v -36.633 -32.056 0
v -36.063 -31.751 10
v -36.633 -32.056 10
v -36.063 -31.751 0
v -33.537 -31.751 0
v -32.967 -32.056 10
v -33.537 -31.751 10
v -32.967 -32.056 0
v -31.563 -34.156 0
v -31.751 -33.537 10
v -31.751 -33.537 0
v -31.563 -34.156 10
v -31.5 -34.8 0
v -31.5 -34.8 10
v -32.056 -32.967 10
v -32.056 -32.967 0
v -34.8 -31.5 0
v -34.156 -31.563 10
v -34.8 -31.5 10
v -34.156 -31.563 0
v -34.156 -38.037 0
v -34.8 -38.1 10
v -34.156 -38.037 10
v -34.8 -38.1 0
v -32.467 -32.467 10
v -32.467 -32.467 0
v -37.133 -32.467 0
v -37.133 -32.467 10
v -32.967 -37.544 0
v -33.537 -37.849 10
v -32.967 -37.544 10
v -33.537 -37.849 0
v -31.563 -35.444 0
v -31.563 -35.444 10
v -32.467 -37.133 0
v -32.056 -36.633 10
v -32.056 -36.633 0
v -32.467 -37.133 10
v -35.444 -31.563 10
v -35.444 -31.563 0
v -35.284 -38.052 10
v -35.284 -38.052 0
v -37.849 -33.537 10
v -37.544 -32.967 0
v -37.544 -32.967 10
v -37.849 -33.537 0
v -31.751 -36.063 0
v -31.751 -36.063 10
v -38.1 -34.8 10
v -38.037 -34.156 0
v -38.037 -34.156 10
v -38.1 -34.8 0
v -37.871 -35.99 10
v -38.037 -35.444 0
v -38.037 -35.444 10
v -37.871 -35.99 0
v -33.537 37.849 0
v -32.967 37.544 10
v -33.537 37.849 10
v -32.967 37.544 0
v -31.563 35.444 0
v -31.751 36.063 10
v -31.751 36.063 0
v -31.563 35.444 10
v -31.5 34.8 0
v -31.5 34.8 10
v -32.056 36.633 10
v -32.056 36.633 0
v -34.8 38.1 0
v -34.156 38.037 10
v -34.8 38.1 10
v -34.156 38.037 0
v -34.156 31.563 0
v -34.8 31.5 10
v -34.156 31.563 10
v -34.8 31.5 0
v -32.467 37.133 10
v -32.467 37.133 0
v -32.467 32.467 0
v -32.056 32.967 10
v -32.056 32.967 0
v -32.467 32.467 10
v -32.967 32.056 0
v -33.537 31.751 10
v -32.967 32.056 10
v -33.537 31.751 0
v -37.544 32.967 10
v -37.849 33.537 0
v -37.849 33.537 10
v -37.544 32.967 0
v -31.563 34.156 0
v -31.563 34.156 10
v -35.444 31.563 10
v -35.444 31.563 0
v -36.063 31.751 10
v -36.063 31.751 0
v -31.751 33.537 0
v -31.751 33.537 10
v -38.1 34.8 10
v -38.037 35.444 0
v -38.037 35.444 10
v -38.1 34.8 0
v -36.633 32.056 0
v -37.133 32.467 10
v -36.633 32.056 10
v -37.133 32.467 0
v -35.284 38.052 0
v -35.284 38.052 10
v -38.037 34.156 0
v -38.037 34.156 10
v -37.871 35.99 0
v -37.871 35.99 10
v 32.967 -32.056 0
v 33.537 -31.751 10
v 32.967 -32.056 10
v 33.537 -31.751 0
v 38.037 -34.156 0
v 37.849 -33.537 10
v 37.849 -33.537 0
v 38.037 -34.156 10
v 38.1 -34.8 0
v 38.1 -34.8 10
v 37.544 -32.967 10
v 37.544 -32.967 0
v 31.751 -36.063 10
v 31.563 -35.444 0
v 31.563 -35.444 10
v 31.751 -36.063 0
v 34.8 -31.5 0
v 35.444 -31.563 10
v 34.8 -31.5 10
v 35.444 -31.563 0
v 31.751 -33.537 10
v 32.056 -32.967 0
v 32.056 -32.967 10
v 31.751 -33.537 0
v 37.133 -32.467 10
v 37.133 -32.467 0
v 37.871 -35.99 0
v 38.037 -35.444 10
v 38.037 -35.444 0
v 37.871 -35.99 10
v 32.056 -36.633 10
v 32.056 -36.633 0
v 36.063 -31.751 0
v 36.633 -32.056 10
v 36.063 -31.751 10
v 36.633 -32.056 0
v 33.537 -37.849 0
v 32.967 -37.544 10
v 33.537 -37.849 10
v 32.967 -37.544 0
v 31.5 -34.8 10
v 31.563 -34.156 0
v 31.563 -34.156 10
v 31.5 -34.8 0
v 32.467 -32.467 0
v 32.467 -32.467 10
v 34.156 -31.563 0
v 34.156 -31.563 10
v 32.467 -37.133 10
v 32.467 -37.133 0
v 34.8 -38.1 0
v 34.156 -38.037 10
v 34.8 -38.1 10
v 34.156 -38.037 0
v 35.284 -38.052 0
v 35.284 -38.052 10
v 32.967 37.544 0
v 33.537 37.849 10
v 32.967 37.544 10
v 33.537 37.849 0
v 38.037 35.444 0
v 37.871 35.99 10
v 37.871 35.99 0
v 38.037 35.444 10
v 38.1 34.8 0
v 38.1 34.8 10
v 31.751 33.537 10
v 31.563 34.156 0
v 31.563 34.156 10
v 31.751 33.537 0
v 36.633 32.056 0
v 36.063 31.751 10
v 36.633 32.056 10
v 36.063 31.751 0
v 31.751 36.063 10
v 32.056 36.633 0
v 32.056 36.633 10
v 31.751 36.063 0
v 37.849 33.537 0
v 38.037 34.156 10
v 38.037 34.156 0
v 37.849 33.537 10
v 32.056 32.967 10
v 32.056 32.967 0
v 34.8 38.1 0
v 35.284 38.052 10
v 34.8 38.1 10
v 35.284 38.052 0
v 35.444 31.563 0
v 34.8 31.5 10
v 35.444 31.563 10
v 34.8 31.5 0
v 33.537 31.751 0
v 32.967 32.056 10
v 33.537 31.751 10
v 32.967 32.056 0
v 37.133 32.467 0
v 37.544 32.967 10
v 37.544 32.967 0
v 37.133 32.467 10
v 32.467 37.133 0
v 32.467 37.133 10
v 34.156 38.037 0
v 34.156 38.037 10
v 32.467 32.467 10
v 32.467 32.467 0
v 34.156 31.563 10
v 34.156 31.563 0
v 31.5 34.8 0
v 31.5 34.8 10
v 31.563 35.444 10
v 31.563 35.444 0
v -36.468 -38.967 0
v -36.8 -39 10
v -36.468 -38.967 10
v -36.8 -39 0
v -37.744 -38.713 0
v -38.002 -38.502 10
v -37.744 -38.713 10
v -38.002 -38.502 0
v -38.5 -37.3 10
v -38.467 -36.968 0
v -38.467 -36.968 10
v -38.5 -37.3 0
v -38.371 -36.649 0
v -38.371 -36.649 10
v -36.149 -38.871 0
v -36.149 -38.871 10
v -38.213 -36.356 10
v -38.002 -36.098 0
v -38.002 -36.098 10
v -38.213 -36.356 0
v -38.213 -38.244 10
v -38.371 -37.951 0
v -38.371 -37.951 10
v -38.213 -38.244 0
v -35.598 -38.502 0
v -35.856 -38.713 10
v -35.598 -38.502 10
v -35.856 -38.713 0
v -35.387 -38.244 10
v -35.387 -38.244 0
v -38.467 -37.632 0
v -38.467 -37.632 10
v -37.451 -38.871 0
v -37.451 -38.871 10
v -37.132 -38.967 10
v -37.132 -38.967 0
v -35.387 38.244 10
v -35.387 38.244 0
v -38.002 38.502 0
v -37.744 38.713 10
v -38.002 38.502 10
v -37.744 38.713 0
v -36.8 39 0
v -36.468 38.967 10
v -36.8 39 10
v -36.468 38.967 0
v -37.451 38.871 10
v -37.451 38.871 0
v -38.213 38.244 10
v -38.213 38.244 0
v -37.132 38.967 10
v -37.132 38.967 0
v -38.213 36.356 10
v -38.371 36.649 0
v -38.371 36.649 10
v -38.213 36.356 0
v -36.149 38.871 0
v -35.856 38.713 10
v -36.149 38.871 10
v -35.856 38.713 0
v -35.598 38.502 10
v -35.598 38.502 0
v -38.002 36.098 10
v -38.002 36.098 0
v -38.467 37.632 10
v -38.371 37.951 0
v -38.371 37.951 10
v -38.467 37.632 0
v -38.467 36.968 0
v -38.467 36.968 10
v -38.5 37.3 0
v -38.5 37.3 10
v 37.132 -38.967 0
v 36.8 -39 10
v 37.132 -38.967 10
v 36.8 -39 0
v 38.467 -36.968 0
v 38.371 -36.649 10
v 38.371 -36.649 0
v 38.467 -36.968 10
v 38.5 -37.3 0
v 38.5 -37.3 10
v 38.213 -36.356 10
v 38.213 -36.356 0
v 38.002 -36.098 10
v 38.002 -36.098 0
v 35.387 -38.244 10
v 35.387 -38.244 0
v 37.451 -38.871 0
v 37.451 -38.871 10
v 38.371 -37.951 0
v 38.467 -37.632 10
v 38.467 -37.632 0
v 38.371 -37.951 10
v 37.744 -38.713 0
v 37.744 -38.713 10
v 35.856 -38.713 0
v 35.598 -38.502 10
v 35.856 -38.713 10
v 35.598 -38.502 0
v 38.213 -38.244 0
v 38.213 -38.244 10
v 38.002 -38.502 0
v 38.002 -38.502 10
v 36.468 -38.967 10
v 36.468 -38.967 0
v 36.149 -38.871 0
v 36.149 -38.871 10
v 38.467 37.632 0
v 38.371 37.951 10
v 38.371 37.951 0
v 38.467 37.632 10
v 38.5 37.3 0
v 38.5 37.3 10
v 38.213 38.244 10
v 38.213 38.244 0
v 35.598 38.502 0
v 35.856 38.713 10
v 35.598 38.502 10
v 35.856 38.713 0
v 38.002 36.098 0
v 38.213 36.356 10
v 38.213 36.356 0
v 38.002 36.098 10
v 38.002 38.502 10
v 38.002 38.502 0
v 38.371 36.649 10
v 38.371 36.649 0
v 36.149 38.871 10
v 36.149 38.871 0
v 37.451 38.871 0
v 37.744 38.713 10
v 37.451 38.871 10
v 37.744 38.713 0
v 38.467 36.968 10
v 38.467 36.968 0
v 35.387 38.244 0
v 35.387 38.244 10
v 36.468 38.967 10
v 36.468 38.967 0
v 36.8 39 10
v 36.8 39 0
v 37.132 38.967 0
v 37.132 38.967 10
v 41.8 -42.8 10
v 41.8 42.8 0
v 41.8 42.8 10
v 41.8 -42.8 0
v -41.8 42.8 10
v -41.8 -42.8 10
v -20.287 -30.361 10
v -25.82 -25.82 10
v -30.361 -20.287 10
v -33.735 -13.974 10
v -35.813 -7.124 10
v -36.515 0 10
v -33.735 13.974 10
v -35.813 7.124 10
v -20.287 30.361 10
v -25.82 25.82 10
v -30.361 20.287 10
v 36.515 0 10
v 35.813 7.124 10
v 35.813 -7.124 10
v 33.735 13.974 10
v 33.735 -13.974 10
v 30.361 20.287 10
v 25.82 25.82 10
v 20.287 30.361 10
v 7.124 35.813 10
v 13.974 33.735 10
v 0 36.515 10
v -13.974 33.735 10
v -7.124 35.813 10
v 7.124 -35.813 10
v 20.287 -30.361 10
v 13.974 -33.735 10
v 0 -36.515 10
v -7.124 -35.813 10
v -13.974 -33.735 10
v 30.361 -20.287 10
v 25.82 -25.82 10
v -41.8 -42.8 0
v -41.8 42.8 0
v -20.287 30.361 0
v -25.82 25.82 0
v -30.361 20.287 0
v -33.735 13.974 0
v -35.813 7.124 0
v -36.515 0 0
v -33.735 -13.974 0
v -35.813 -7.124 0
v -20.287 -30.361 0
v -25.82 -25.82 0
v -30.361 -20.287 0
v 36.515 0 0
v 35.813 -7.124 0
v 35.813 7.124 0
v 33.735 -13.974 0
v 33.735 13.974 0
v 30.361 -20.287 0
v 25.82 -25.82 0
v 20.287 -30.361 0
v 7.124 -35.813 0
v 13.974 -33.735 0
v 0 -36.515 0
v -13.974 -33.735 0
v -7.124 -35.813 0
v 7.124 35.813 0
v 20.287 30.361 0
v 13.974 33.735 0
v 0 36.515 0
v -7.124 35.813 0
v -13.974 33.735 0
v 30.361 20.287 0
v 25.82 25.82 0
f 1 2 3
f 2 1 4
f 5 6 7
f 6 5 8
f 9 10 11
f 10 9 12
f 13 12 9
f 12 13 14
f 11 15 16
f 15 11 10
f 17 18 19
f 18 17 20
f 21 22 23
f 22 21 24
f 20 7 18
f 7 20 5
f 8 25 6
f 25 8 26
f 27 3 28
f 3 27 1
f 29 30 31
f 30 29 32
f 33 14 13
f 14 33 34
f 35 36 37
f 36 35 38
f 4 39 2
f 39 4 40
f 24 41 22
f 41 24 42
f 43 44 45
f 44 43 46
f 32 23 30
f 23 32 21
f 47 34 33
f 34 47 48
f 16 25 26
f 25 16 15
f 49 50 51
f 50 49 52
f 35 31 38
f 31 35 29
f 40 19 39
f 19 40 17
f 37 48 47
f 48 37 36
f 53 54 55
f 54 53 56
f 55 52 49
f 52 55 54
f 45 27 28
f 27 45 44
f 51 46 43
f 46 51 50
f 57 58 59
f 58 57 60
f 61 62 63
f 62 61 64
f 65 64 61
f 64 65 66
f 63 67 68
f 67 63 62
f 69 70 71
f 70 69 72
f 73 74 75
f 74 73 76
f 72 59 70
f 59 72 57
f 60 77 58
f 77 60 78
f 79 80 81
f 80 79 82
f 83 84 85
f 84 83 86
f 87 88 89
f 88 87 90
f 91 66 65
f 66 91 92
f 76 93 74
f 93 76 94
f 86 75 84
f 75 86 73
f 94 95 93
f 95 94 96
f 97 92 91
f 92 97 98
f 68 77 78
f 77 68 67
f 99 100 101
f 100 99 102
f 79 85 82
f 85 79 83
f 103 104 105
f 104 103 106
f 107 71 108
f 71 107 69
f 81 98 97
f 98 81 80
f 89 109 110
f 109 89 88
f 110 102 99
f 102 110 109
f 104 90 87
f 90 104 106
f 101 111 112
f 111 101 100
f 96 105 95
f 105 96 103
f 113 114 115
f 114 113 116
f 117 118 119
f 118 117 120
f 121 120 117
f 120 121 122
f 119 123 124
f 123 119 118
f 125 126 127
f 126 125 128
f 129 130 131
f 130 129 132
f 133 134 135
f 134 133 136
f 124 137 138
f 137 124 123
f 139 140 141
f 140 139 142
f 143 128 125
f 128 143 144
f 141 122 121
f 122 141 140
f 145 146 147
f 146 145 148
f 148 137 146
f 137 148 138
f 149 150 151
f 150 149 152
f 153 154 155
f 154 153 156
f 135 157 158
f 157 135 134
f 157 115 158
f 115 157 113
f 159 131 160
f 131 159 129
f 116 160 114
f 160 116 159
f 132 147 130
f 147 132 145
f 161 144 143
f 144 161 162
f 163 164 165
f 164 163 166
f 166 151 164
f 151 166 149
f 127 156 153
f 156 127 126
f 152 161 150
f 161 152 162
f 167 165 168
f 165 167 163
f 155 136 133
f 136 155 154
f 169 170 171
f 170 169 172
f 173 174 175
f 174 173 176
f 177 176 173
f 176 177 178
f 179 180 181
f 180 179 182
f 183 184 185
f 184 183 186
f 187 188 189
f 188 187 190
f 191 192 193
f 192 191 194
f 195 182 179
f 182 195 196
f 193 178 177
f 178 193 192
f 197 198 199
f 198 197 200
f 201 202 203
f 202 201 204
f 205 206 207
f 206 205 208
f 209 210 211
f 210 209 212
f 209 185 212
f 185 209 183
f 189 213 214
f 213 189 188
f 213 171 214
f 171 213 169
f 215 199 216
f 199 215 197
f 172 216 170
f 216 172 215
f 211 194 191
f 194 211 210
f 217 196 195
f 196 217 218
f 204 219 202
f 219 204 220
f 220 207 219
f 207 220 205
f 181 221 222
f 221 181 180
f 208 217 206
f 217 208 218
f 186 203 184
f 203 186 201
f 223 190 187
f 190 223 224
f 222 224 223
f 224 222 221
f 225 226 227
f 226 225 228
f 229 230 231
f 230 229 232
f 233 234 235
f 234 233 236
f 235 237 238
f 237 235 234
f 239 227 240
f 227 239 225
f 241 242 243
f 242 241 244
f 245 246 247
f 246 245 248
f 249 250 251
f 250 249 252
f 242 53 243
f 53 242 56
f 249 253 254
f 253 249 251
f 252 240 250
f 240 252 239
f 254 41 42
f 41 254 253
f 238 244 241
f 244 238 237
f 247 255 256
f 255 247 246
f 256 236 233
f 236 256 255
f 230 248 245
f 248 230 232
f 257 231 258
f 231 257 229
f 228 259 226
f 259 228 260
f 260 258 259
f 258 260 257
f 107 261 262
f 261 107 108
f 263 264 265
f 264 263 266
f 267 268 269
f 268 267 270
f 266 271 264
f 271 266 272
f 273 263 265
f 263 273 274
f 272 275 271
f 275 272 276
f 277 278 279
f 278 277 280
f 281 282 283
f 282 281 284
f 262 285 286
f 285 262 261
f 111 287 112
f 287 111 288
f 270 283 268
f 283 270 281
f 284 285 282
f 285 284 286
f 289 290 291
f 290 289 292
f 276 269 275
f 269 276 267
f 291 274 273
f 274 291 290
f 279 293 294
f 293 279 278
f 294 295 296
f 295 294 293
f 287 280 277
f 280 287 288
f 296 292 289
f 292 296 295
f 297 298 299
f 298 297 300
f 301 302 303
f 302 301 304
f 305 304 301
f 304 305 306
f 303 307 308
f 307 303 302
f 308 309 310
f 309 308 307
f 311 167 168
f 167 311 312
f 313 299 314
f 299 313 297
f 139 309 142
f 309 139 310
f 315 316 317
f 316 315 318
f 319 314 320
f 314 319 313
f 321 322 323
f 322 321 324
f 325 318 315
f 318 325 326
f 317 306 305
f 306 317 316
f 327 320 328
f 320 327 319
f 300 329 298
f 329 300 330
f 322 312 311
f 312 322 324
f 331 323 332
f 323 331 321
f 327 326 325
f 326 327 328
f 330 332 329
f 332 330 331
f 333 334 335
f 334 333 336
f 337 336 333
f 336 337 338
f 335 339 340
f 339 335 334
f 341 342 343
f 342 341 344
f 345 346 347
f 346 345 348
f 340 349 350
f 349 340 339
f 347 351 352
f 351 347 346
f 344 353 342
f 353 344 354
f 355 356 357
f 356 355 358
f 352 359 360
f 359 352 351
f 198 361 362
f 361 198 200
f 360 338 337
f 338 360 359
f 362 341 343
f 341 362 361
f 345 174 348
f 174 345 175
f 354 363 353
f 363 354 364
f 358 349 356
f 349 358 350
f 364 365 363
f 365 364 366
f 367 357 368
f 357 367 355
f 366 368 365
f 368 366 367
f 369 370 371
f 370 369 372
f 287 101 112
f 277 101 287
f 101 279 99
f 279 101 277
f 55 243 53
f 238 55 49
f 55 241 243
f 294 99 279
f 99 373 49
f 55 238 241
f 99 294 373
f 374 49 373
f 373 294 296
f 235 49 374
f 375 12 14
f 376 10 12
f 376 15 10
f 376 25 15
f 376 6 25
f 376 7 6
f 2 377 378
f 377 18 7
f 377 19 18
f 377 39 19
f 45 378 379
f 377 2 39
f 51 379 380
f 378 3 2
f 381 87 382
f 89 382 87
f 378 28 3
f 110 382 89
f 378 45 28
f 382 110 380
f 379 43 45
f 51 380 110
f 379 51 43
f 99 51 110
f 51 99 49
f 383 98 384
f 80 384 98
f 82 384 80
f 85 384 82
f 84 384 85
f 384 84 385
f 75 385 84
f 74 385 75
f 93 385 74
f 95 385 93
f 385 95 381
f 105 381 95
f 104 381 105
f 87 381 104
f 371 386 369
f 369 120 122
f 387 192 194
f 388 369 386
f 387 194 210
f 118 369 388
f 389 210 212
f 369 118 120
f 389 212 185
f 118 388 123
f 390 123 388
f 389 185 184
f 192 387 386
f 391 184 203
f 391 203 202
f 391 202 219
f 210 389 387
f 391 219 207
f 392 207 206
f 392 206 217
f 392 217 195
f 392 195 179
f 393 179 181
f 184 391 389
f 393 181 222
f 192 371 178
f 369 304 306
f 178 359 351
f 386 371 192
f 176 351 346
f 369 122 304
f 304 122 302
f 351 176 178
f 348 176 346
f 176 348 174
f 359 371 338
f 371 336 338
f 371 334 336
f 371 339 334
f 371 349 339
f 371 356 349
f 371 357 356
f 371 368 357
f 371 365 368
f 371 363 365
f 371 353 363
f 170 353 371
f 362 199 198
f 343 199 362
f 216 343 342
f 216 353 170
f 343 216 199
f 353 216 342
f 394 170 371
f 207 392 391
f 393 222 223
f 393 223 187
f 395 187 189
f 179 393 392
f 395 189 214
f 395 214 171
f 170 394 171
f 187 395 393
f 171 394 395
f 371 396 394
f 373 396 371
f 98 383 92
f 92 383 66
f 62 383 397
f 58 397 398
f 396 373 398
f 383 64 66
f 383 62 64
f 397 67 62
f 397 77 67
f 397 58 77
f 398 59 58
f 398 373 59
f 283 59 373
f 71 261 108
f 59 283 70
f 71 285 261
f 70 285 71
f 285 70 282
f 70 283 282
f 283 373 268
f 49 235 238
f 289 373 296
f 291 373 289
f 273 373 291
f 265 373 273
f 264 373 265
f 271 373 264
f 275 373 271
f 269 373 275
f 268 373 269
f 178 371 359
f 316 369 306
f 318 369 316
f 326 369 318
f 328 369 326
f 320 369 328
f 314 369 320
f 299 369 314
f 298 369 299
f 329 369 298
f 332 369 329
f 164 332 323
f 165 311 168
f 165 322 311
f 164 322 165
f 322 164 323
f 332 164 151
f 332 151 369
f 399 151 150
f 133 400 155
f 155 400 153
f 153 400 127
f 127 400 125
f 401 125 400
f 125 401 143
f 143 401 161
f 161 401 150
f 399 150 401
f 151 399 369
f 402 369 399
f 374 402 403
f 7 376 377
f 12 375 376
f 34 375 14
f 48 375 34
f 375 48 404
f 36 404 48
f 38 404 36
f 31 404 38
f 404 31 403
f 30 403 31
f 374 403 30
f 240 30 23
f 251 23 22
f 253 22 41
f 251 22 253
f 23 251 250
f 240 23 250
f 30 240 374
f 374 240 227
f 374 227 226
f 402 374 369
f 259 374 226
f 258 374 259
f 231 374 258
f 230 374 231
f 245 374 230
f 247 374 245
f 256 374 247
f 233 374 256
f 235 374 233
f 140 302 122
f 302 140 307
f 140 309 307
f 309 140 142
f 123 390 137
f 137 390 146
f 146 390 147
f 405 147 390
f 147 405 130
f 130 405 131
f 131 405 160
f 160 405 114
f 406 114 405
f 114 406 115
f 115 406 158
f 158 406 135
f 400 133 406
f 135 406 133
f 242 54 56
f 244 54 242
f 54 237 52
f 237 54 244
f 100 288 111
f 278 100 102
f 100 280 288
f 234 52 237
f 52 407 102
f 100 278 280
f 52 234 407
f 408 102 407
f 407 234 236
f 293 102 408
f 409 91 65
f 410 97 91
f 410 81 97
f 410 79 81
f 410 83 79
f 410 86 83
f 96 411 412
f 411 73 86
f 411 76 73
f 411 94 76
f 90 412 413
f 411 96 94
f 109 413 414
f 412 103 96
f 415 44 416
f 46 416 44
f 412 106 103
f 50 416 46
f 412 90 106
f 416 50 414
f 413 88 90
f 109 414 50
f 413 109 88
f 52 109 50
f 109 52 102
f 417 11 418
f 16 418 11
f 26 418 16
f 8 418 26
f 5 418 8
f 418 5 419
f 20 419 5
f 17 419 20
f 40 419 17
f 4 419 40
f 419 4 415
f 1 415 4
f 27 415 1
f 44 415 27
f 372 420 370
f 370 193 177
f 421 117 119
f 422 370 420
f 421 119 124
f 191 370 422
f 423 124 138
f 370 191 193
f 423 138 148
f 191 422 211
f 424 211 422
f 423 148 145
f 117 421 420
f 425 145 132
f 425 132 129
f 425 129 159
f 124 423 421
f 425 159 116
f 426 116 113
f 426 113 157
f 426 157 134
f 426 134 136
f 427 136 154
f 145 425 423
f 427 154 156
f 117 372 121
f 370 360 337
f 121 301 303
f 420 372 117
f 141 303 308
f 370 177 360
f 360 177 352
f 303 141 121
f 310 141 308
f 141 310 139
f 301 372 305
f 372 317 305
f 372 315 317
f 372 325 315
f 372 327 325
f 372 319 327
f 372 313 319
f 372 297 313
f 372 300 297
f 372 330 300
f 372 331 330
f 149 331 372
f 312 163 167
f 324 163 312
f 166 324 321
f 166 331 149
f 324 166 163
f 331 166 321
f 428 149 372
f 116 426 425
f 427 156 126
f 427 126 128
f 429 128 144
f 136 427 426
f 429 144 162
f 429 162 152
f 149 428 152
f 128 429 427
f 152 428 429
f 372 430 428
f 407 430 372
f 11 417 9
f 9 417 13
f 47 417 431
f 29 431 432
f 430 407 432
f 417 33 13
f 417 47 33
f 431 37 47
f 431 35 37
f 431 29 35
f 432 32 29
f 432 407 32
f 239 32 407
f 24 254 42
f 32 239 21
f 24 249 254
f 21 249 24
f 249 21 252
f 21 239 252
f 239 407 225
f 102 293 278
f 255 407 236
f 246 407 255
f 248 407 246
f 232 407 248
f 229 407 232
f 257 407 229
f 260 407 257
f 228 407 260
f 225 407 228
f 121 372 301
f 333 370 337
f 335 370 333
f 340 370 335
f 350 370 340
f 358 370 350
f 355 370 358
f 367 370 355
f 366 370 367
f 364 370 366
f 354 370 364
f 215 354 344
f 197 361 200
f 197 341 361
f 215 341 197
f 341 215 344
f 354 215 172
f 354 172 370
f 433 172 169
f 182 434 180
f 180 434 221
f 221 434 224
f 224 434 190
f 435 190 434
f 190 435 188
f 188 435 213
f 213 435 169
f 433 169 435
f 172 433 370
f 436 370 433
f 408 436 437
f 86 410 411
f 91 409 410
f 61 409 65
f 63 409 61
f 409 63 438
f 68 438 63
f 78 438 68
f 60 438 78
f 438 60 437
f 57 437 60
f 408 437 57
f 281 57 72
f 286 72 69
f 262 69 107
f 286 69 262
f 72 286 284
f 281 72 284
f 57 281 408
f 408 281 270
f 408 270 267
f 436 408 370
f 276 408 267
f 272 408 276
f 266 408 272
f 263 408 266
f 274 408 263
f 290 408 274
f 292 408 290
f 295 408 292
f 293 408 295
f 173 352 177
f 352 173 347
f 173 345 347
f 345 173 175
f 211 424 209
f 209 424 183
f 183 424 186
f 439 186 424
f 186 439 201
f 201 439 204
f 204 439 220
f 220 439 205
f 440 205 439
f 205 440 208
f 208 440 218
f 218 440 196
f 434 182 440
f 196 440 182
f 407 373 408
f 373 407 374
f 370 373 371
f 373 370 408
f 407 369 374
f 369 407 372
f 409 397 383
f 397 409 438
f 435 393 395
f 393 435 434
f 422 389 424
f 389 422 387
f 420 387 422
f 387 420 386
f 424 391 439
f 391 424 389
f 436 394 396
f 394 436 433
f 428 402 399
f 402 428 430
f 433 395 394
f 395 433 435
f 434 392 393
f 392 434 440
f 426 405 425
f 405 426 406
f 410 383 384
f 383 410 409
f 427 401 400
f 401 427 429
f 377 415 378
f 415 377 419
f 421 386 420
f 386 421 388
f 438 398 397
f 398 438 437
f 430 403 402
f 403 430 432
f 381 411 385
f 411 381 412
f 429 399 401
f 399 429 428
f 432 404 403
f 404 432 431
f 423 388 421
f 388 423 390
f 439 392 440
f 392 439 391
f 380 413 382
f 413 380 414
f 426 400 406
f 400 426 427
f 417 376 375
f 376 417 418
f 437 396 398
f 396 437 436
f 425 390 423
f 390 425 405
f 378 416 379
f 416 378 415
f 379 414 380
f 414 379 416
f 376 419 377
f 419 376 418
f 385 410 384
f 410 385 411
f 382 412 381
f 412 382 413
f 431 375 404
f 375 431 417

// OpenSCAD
$fn = 32;

// ----------------------------------------------------------------------
// Motor mount plate: NEMA34, 83.6 x 85.6 x 10 mm
// ----------------------------------------------------------------------

// --- parameters (mm) ---
plate_w = 83.6;           // plate length, X
plate_d = 85.6;           // plate width, Y
plate_t = 10;             // plate thickness
pattern = 69.6;           // NEMA34 bolt spacing
motor_d = 6.6;            // NEMA34 screw clearance
pilot_d = 73.03;          // pilot boss bore
second_d = 3.4;           // second fastener hole

module plate() {
  translate([-plate_w / 2, -plate_d / 2, 0]) cube([plate_w, plate_d, plate_t]);
}

module motor_holes() {
  for (sx = [-1, 1]) for (sy = [-1, 1])
    translate([sx * pattern / 2, sy * pattern / 2, -1])
      cylinder(h = plate_t + 2, d = motor_d);
}

difference() {
  union() {
    plate();
  }
  motor_holes();
  translate([0, 0, -1]) cylinder(h = plate_t + 2, d = pilot_d);
  for (sx = [-1, 1]) for (sy = [-1, 1])
    translate([sx * 36.8, sy * 37.3, -1]) cylinder(h = plate_t + 2, d = second_d);
}
